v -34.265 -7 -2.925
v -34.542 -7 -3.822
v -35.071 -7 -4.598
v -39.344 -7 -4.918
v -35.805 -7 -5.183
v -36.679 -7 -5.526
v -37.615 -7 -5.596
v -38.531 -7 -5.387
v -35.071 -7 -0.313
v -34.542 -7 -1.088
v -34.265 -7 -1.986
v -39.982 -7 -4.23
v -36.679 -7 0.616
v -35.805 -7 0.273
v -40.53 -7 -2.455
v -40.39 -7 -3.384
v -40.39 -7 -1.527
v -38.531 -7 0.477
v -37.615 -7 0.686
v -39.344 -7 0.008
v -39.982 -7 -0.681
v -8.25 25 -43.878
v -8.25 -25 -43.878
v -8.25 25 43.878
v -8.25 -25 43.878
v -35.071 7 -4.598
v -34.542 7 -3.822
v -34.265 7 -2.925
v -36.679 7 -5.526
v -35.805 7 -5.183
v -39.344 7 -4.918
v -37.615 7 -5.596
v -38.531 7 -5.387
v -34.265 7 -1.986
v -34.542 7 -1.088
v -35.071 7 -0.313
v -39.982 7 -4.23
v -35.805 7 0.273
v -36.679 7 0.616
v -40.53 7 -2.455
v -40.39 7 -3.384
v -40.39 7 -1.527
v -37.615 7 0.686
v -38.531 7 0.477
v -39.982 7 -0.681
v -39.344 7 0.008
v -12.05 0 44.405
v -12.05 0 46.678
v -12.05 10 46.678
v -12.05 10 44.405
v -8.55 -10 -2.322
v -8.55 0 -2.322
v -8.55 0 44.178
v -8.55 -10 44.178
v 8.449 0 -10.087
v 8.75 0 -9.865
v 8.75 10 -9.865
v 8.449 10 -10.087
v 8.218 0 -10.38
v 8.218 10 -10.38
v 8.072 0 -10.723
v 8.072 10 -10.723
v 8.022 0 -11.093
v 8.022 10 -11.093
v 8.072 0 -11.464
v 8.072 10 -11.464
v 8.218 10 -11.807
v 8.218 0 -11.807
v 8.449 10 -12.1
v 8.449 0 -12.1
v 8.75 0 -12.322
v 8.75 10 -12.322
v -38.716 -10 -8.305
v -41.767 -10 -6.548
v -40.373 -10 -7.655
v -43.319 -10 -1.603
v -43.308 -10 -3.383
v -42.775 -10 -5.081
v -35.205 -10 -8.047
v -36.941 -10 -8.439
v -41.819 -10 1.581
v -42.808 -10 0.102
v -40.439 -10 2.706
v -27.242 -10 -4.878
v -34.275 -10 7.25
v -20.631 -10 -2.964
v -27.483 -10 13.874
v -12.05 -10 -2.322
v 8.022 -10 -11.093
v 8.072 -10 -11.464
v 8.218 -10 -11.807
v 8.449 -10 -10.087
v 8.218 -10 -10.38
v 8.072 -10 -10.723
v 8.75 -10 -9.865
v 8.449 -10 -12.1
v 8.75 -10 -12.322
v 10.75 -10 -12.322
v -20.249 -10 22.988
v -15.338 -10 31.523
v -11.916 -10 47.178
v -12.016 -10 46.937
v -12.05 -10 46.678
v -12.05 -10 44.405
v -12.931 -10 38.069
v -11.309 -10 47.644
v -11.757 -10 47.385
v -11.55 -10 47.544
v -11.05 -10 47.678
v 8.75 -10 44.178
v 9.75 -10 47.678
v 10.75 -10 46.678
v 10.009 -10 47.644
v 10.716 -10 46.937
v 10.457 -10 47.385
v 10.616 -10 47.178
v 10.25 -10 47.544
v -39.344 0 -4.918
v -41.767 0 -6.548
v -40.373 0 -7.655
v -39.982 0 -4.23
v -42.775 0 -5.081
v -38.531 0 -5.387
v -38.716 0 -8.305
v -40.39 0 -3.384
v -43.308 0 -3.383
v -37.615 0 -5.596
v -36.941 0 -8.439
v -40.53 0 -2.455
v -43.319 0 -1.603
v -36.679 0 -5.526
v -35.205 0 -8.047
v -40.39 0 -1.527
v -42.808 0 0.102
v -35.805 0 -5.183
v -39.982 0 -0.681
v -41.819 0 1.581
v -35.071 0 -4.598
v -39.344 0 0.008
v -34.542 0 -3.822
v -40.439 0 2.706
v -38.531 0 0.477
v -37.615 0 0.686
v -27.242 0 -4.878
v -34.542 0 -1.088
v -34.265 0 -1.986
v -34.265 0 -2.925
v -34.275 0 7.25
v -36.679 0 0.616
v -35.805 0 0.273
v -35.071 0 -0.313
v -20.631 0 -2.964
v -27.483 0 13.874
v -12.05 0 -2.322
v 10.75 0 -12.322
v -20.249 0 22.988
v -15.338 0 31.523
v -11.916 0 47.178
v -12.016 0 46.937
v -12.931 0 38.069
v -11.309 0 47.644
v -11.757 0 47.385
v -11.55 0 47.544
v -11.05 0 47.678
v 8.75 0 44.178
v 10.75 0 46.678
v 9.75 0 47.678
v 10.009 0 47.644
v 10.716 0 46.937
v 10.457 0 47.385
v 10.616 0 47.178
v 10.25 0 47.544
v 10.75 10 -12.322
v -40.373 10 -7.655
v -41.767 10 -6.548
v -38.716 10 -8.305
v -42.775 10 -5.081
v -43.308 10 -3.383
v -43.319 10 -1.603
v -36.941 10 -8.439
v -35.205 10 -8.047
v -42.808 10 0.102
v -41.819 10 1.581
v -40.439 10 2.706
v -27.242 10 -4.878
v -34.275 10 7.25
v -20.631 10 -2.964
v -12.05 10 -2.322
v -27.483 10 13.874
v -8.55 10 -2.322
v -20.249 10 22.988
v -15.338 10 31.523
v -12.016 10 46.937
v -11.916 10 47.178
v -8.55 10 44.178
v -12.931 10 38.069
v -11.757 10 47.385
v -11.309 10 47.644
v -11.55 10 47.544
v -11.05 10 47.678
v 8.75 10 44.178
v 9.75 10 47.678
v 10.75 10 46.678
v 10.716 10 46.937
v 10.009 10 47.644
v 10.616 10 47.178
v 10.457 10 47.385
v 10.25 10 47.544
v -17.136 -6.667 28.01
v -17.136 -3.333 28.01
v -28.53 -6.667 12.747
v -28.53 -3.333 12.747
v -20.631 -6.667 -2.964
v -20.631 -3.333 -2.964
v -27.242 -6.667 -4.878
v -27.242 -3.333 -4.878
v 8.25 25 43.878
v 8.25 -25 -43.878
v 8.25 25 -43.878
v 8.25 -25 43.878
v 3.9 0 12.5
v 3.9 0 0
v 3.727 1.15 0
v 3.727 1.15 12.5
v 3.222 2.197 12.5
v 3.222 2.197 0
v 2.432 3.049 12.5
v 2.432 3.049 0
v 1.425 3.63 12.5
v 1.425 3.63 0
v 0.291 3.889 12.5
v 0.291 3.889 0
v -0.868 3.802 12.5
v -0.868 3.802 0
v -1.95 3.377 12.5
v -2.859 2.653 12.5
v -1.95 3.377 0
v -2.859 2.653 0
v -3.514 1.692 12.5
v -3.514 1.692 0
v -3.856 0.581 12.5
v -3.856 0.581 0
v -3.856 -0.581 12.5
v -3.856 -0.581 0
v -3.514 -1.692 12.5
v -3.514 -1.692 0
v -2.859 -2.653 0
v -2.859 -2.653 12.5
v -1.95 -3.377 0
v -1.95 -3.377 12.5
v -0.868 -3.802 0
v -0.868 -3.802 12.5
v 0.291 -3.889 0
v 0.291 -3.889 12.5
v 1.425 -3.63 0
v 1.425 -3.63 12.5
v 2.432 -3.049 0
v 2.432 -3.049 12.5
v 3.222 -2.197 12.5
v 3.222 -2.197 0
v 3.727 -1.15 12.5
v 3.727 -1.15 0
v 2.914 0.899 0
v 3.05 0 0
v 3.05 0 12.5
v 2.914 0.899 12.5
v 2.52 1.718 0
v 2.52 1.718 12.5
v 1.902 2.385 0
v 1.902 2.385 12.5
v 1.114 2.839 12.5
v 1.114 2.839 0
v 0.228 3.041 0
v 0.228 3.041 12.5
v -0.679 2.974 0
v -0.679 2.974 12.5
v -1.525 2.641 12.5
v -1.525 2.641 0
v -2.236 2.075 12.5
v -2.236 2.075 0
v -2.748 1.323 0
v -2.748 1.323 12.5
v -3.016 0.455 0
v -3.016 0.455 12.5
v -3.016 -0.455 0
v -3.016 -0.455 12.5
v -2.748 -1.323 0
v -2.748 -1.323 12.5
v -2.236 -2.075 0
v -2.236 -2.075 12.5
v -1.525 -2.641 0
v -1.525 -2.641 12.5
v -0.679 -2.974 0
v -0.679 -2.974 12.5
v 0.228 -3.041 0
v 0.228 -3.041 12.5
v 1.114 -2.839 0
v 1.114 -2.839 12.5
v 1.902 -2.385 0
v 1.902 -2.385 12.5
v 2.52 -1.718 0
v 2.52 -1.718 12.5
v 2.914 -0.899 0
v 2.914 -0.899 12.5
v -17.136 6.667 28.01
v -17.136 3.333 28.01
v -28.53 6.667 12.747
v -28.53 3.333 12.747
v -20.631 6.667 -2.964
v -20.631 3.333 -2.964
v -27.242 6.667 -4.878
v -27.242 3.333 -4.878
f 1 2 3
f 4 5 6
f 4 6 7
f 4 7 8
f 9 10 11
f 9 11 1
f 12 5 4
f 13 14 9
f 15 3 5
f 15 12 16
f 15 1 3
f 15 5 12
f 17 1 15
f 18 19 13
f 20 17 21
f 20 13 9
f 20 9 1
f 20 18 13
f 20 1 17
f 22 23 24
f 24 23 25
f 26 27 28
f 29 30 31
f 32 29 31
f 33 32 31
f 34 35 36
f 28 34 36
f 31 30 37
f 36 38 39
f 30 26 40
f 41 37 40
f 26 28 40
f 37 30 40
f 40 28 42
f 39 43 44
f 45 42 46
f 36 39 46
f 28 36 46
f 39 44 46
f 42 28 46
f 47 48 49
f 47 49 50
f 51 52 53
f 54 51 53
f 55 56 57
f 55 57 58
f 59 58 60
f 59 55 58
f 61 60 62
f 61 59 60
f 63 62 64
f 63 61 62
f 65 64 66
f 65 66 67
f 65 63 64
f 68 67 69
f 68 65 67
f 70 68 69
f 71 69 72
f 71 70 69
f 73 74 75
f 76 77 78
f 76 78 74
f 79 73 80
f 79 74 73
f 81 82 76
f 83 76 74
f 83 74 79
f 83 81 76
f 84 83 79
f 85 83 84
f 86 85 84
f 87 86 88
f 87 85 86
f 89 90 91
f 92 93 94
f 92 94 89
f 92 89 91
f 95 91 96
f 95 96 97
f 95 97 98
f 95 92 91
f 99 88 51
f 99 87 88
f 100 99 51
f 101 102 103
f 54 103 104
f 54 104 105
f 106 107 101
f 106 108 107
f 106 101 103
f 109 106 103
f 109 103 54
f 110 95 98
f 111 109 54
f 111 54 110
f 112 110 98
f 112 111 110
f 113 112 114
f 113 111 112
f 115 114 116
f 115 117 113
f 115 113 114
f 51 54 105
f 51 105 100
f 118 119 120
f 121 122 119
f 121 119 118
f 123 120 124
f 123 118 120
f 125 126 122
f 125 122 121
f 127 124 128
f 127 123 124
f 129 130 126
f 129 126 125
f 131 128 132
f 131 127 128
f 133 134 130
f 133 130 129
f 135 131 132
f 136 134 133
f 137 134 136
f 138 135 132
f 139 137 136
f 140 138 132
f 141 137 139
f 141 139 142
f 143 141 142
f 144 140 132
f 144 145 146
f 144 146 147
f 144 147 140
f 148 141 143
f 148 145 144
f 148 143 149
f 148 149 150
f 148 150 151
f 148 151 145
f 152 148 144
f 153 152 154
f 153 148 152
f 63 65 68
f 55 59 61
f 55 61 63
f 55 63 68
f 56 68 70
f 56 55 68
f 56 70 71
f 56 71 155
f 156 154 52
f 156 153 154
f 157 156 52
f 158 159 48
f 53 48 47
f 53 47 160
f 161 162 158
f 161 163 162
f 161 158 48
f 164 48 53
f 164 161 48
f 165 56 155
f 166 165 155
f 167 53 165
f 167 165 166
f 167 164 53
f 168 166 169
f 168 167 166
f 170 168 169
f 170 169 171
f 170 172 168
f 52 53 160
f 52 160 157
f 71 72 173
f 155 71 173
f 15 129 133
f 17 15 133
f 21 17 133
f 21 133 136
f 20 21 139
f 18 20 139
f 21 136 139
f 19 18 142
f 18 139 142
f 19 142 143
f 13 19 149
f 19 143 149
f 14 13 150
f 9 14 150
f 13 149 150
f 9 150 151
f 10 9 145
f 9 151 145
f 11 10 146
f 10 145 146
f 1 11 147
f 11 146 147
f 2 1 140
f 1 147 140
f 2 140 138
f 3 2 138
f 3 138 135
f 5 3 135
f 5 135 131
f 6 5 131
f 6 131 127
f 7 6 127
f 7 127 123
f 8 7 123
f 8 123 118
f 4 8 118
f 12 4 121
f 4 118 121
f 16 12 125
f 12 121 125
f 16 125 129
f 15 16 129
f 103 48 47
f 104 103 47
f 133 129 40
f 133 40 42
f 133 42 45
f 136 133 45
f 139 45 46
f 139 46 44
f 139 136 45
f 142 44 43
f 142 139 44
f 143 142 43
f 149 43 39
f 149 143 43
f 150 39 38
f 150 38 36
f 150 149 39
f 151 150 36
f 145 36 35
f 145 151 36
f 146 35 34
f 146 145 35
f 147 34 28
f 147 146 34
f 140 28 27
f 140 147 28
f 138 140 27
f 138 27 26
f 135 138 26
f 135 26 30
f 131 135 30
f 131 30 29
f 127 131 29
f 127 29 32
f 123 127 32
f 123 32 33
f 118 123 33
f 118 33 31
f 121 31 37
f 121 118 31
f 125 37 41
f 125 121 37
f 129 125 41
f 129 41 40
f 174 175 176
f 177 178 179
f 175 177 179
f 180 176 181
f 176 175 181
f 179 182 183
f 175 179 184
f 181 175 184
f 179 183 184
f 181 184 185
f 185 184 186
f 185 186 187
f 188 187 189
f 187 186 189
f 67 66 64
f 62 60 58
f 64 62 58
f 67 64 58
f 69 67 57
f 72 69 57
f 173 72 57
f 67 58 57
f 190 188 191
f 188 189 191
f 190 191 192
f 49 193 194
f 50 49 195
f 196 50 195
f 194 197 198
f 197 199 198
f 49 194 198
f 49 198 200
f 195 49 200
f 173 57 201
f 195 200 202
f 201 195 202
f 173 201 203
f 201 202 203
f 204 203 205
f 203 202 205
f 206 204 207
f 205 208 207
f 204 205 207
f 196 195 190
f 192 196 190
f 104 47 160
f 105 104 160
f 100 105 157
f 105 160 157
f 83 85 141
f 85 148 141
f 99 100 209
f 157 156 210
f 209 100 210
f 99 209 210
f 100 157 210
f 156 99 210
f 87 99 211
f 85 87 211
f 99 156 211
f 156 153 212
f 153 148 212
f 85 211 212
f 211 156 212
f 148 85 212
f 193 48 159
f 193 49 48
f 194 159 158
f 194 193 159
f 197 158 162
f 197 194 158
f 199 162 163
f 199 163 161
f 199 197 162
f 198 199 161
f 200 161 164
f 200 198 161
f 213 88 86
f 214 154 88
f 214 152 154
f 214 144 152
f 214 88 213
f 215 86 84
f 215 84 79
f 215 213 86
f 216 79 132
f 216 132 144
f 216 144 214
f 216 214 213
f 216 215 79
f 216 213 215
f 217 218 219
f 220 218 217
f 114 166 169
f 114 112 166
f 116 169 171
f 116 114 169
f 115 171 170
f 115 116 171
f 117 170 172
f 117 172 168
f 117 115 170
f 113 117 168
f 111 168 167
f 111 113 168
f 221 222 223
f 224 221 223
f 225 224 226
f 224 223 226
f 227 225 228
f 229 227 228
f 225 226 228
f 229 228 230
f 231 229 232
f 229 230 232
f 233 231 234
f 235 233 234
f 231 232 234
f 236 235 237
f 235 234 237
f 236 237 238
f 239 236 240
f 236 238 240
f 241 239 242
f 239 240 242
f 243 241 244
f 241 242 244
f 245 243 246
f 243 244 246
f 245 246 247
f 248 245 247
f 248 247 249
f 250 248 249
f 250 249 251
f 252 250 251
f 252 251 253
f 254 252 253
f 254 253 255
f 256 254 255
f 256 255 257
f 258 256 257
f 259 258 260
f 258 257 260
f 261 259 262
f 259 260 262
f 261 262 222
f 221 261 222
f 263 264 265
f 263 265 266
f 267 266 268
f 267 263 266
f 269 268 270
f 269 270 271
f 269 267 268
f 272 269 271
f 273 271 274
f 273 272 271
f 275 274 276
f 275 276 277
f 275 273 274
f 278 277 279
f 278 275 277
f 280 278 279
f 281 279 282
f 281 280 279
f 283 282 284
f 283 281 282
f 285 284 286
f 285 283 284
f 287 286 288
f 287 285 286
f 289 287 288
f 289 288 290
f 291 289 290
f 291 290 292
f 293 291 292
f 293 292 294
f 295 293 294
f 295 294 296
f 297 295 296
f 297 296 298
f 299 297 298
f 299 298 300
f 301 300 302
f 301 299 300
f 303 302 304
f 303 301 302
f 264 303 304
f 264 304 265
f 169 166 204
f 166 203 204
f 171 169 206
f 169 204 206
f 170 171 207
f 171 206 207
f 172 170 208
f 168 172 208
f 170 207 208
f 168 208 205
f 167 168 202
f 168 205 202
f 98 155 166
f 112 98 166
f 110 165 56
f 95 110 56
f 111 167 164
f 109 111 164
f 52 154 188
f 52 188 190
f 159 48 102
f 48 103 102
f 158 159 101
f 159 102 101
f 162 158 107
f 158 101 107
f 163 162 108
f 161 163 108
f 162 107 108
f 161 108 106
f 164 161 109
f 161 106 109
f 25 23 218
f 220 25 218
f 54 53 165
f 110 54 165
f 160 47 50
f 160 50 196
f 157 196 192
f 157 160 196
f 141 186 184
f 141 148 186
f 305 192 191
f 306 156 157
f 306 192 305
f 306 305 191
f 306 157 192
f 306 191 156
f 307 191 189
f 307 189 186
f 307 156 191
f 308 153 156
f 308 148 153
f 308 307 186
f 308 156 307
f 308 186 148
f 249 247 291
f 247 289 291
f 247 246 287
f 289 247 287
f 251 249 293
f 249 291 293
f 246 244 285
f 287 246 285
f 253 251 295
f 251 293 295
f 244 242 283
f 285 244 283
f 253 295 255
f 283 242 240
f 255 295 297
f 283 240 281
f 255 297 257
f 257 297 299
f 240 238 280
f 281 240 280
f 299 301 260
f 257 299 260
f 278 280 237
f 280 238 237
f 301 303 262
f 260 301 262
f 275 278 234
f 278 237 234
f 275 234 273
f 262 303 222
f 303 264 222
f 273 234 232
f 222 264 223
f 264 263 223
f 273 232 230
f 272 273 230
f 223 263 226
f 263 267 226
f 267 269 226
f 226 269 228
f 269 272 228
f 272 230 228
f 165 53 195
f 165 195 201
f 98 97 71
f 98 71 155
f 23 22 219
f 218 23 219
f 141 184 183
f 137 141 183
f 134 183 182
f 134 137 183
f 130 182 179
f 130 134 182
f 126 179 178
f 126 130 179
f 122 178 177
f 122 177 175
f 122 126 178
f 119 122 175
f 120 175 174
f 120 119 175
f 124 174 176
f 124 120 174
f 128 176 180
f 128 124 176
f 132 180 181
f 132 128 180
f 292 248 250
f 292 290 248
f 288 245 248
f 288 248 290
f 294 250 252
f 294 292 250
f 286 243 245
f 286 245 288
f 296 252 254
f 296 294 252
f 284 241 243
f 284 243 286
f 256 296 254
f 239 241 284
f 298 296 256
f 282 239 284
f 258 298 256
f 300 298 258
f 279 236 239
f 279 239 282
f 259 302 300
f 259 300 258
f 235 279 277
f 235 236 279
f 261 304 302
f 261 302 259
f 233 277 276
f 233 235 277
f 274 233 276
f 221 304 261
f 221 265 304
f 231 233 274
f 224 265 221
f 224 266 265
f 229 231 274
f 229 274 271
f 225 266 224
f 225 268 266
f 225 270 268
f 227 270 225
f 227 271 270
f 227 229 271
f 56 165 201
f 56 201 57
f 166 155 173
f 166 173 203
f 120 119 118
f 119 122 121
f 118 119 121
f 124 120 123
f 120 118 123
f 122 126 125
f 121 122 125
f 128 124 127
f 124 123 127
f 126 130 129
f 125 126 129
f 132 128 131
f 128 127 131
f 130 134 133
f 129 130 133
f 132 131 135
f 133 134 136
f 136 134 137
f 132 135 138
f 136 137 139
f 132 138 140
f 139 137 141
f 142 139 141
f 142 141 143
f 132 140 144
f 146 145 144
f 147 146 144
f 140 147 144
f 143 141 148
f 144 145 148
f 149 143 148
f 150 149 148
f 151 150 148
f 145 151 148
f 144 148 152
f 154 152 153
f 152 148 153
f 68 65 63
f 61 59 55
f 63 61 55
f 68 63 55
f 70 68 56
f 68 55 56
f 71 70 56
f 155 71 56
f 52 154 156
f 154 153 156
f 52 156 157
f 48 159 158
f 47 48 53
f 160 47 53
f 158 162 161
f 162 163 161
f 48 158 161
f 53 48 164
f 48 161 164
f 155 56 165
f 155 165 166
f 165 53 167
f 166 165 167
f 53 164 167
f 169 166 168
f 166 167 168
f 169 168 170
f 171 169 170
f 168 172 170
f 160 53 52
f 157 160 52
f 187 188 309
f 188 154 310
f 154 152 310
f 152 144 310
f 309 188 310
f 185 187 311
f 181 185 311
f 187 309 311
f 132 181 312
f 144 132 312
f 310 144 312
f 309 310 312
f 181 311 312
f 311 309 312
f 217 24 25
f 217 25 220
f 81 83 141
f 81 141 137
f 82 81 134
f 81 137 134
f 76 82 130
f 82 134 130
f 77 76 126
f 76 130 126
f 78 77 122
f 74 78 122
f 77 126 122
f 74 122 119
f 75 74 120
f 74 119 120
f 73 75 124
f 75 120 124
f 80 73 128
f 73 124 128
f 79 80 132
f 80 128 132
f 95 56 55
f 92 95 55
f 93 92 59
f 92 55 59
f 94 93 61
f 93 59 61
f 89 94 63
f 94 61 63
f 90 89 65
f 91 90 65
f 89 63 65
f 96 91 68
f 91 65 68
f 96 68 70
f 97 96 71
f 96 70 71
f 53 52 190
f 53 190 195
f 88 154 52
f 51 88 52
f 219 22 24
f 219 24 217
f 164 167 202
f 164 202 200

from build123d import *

# Parameters (mm, degrees)
F0_W          = 16.5
F0_H          = 87.75664
F1_DEPTH      = 25
F1_DEPTH_BACK = 25
F3_DEPTH      = 10
F4_R          = 3.15
F5_DEPTH      = 7
F6_R          = 1
F8_R          = 3.9
F8_R_2        = 3.05
F9_DEPTH      = 12.5


with BuildPart() as f1:
    # F0 (on Front) → F1 (new body, two sides)
    with BuildSketch(Plane.XZ) as f1_sk:
        Rectangle(F0_W, F0_H)
    extrude(amount=F1_DEPTH)
    extrude(f1_sk.sketch, amount=-F1_DEPTH_BACK)


with BuildPart() as f3:
    # F2 (on Front) → F3 (new body)
    with BuildSketch(Plane.XZ):
        Polygon((-8.55, -2.32168), (-8.55, 44.17832), (8.75, 44.17832), (8.75, -9.865314), (8.75, -12.32168), (10.75, -12.32168), (10.75, 47.67832), (-12.05, 47.67832), (-12.05, 44.405476), (-12.05, -2.32168), align=None)
        with BuildLine():
            add(Edge.make_bspline(
                [(-12.05, -2.32168), (-22.723591, -2.32168), (-25.45882, -4.257001), (-35.205163, -8.047218)],
                knots=[0, 0, 0, 0, 23.852533, 23.852533, 23.852533, 23.852533], degree=3))
            Line((-12.05, -2.32168), (-12.05, 44.405476))
            add(Edge.make_bspline(
                [(-12.05, 44.405476), (-12.05, 28.805908), (-30.203268, 8.77412), (-40.439443, 2.706089)],
                knots=[0, 0, 0, 0, 50.446005, 50.446005, 50.446005, 50.446005], degree=3))
            ThreePointArc((-40.439443, 2.706089), (-34.409785, 2.758149), (-31.379827, -2.455185))
            ThreePointArc((-31.379827, -2.455185), (-32.427656, -5.84281), (-35.205163, -8.047218))
        make_face()
        with BuildLine():
            Line((8.75, -12.32168), (8.75, -9.865314))
            ThreePointArc((8.75, -9.865314), (8.021987, -11.093497), (8.75, -12.32168))
        make_face()
        with BuildLine():
            ThreePointArc((-40.439443, 2.706089), (-42.774656, -5.081173), (-35.205163, -8.047218))
            ThreePointArc((-35.205163, -8.047218), (-32.427656, -5.84281), (-31.379827, -2.455185))
            ThreePointArc((-31.379827, -2.455185), (-34.409785, 2.758149), (-40.439443, 2.706089))
        make_face()
    extrude(amount=F3_DEPTH)

    # F4 (on face) → F5 (cut)
    with BuildSketch(Plane(origin=(0, 0, 0), x_dir=(-1, 0, 0), z_dir=(0, 1, 0))):
        with Locations((37.379827, -2.455185)):
            Circle(F4_R)
    extrude(amount=-F5_DEPTH, mode=Mode.SUBTRACT)

    # F6
    f6_edges = [f3.edges().sort_by_distance(p)[0] for p in [
        (10.75, -5, 47.67832),
        (-12.05, -5, 47.67832),
    ]]
    fillet(f6_edges, radius=F6_R)


with BuildPart() as f7_1:
    # F7: instance of F3
    add(f3.part.mirror(Plane.XZ))


with BuildPart() as f9:
    # F8 (on Top) → F9 (new body)
    with BuildSketch(Plane.XY):
        Circle(F8_R)
        Circle(F8_R_2, mode=Mode.SUBTRACT)
    extrude(amount=F9_DEPTH)


solid = Compound([f1.part, f3.part, f7_1.part, f9.part])
